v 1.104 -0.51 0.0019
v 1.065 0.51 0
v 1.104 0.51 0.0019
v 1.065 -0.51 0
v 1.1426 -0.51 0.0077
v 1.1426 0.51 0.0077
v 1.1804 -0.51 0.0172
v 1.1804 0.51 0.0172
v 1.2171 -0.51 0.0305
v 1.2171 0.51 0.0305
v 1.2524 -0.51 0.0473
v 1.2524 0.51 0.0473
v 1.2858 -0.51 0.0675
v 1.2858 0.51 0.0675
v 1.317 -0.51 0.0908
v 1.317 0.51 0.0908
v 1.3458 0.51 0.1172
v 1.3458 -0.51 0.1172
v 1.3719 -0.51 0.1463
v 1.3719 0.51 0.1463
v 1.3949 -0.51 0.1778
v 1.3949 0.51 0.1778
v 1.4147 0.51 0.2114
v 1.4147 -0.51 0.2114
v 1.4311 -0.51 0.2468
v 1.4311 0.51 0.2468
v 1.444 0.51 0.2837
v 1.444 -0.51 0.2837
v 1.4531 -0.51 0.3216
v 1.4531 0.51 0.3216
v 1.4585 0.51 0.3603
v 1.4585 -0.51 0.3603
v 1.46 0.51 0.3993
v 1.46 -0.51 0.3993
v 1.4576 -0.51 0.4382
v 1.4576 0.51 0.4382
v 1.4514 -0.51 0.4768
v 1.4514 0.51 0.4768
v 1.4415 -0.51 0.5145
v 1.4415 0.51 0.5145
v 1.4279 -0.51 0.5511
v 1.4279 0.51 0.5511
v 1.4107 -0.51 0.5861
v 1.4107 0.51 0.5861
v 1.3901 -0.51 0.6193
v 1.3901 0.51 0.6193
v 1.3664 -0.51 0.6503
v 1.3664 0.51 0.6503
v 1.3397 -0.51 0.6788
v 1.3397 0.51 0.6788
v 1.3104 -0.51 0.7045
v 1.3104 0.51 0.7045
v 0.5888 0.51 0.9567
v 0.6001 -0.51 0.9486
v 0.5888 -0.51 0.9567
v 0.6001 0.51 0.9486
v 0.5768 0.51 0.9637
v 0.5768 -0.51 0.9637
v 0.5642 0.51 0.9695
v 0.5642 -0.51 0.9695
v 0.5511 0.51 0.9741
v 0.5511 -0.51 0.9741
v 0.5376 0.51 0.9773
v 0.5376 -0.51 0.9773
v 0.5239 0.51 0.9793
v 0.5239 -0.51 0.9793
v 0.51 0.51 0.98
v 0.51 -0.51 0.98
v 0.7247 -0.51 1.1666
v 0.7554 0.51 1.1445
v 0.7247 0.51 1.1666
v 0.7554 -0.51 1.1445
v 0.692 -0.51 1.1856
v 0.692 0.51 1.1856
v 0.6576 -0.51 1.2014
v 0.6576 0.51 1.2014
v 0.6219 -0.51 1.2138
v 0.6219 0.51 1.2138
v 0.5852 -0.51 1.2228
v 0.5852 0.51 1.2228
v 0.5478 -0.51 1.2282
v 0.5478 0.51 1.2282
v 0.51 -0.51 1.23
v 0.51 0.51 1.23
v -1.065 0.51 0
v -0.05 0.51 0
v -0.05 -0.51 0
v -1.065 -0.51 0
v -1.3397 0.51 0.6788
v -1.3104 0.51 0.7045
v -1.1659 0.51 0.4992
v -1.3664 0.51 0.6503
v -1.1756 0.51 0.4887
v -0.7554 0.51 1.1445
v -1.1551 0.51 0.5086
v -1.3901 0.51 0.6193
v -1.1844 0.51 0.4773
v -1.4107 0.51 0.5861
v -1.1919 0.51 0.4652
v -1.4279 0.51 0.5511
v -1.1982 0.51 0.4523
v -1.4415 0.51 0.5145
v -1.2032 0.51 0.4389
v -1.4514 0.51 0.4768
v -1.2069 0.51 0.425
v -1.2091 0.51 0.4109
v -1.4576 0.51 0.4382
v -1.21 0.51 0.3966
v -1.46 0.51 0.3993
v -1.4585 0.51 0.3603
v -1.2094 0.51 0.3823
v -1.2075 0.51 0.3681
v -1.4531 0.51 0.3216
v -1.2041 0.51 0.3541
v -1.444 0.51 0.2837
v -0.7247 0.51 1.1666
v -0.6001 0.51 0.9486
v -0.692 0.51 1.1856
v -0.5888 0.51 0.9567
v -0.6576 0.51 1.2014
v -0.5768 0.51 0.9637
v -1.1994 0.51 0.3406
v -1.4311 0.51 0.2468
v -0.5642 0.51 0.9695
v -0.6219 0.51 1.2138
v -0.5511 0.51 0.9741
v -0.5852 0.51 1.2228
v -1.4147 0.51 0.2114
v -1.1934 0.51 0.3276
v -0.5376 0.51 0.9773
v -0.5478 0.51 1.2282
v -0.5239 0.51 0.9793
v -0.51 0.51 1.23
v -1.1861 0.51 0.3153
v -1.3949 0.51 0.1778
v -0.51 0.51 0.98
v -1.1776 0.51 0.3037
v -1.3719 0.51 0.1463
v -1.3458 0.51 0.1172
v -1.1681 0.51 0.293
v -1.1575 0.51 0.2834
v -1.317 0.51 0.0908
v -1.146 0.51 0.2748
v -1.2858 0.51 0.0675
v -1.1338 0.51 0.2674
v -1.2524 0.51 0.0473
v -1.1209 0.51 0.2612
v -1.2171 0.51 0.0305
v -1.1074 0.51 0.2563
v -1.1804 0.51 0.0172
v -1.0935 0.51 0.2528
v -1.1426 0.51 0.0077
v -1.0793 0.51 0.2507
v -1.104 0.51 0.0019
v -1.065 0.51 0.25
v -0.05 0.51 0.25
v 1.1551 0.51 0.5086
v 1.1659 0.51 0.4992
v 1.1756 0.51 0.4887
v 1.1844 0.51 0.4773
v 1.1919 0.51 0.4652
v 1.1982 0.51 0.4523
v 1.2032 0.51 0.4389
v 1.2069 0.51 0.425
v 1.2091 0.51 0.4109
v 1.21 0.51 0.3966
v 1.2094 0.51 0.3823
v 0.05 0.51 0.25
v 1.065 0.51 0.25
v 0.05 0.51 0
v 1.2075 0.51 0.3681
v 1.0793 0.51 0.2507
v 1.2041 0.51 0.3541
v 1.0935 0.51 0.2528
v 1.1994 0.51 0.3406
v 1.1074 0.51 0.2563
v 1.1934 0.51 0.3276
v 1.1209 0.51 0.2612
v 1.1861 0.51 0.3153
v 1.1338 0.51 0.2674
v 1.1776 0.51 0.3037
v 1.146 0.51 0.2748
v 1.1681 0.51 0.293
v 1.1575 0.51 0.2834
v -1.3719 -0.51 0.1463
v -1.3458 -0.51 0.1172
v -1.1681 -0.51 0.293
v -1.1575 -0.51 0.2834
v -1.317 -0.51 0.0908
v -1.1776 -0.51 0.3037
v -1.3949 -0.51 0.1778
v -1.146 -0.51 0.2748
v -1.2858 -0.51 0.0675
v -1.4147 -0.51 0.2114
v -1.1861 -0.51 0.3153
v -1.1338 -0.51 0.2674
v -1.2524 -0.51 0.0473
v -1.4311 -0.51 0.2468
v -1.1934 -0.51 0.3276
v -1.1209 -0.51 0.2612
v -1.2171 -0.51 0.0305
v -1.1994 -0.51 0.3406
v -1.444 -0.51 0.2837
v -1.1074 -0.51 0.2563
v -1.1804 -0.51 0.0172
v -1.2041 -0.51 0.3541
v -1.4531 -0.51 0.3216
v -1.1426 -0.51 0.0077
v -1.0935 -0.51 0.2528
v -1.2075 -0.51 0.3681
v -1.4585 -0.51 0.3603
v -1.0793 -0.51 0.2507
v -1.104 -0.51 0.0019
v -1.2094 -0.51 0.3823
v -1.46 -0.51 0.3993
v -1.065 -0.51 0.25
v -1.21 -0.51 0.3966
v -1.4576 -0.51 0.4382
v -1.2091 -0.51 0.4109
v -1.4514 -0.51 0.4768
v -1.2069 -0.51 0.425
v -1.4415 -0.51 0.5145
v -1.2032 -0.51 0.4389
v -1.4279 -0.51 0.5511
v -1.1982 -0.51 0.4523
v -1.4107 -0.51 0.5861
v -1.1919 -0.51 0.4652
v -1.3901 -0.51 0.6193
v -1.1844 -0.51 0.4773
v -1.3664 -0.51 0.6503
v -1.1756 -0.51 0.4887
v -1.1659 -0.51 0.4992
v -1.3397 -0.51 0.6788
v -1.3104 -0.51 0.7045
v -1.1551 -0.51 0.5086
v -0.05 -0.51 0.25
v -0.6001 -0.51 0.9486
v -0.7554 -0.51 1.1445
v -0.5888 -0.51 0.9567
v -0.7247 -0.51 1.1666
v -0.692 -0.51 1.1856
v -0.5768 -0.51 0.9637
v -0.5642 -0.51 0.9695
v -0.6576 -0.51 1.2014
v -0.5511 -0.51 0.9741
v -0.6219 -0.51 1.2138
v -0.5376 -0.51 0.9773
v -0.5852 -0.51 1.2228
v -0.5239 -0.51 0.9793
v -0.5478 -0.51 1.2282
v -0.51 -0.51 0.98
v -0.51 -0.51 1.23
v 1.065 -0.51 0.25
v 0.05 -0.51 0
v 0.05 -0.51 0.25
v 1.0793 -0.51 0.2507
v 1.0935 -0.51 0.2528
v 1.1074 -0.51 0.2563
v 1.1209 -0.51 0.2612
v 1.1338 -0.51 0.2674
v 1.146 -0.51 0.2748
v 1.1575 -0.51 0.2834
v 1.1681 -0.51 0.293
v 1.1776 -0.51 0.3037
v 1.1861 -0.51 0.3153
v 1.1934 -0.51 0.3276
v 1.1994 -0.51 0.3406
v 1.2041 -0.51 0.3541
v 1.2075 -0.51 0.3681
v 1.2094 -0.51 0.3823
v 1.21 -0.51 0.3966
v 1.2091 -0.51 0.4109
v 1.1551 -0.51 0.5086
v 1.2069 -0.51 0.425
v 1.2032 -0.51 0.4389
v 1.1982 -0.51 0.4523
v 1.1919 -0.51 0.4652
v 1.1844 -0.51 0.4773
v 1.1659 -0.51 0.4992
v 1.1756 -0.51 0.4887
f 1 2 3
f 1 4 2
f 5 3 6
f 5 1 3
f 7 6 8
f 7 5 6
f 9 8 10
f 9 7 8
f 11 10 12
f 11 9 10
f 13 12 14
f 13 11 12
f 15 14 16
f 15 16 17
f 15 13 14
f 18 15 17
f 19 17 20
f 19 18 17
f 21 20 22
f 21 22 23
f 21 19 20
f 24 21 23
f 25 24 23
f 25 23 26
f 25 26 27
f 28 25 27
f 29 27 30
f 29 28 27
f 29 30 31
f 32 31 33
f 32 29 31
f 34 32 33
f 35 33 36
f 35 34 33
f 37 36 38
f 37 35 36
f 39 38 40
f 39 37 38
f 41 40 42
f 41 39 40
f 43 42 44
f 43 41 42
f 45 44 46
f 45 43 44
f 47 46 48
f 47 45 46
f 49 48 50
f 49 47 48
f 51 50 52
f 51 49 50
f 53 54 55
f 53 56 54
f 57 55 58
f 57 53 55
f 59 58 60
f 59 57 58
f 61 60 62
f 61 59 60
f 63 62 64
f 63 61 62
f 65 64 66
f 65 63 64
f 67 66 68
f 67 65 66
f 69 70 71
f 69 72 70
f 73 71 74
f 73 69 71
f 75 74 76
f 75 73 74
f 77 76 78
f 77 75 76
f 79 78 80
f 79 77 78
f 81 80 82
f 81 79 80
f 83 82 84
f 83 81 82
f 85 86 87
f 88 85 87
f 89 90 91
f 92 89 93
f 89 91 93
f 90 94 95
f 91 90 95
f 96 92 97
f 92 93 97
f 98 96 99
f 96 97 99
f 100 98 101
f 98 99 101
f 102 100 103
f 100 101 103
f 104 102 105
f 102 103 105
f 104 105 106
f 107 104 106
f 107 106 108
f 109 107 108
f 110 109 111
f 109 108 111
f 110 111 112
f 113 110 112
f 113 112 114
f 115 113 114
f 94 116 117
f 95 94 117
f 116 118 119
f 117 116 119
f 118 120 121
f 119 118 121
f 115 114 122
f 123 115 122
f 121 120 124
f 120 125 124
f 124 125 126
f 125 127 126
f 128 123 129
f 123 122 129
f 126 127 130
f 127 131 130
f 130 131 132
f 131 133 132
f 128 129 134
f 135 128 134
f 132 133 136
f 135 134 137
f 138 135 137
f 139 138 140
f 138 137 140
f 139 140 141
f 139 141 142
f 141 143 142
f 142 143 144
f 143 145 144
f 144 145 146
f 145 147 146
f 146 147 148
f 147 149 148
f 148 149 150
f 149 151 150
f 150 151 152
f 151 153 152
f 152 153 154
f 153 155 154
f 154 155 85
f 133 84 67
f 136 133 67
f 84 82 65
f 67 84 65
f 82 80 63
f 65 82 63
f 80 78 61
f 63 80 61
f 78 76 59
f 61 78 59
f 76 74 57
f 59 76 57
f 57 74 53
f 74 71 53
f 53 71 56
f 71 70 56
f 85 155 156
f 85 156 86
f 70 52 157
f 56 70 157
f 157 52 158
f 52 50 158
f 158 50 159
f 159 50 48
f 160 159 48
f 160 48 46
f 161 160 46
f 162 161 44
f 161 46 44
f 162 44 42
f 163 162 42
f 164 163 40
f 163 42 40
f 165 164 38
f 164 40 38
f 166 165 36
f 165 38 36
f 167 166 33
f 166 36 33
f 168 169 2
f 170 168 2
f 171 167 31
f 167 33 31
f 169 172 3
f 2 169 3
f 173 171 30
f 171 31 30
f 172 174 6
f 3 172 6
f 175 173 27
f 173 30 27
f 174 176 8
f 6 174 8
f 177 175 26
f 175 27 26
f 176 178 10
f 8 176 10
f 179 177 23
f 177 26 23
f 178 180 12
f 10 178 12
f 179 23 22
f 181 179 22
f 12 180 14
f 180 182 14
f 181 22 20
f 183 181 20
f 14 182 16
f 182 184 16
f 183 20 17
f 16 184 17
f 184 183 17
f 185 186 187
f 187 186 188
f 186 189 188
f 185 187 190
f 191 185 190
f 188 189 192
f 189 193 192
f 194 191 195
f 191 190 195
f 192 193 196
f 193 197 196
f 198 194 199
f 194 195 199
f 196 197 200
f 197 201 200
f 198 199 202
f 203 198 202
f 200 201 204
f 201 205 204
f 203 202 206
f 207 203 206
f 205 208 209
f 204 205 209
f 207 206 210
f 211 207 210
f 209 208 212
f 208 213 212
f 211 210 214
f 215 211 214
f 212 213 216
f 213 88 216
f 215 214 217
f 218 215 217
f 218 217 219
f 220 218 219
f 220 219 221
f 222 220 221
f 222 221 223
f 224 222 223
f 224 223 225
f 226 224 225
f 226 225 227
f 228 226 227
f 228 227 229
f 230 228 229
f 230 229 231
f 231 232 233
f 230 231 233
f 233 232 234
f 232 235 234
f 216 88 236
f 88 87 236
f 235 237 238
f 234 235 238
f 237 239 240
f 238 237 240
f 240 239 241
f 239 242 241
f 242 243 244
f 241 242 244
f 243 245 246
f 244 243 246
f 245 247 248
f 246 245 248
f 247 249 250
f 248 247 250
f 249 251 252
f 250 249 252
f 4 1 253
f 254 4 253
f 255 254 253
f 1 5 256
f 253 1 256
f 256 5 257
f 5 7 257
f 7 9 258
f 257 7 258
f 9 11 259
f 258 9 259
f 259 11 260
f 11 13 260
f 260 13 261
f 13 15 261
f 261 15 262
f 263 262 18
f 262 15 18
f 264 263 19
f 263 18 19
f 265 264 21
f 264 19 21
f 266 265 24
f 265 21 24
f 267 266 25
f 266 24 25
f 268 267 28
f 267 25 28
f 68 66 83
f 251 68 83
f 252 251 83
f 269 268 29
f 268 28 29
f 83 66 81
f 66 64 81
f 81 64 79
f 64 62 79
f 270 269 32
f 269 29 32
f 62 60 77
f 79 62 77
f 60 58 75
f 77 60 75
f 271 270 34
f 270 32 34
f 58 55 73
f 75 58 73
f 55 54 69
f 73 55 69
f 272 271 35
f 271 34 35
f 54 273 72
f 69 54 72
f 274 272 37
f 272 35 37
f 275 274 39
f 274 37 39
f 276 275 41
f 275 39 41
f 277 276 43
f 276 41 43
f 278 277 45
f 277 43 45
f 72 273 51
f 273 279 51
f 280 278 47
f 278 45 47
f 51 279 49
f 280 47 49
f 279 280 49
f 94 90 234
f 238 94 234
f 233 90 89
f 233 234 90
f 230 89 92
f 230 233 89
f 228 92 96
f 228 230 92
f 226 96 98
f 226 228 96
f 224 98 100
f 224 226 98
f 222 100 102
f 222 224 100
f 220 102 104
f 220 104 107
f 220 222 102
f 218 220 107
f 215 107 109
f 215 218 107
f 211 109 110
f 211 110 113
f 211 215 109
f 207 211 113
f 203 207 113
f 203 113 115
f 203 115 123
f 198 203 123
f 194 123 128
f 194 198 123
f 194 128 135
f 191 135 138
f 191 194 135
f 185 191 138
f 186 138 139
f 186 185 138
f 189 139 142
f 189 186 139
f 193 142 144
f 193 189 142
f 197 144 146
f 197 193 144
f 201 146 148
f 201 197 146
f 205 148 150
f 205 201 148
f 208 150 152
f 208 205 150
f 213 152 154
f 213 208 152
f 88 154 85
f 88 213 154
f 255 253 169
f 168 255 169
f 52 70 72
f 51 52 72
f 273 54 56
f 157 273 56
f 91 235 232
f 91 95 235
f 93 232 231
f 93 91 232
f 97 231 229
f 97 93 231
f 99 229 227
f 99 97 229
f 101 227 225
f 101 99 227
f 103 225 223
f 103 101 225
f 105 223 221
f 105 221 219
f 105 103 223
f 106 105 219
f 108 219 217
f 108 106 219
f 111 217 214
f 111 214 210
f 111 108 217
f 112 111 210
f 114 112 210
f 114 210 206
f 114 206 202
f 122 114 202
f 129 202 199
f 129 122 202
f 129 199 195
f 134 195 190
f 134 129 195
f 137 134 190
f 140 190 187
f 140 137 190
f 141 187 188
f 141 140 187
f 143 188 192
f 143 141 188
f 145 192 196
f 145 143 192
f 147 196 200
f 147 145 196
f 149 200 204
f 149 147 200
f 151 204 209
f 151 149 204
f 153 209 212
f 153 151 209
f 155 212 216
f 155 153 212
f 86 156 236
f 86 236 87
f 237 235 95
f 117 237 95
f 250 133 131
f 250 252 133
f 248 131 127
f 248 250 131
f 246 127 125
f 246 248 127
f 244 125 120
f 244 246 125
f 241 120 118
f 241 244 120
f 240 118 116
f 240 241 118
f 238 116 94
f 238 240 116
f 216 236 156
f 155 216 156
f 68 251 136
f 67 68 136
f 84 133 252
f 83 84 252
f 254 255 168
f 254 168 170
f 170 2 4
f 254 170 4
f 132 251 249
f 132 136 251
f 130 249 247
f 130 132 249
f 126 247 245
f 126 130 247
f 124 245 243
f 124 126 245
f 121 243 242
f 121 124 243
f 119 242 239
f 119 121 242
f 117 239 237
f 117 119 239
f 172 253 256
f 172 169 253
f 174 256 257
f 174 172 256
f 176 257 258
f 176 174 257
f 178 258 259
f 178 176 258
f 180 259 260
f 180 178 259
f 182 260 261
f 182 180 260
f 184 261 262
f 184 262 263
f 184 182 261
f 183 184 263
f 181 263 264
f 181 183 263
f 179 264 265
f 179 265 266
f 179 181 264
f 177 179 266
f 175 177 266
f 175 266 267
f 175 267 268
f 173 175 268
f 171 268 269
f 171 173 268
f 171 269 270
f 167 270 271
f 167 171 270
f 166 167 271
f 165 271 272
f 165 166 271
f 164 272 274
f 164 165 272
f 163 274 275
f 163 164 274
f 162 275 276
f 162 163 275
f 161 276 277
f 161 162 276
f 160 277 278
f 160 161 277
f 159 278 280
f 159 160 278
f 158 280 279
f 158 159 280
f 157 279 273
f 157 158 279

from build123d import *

# Parameters (mm, degrees)
SKETCH001_W = 1.02
SKETCH001_H = 0.25


with BuildPart() as part:
    # AdditivePipe: sweep along a path in Sketch
    with BuildLine(Plane.XZ) as additivepipe_path:
        Line((0.05, 0.125), (1.065, 0.125))
        ThreePointArc((1.065, 0.125), (1.319976, 0.30619), (1.232736, 0.606576))
        Line((1.232736, 0.606576), (0.677736, 1.046576))
        ThreePointArc((0.677736, 1.046576), (0.59881, 1.089976), (0.51, 1.105))
        Line((0.51, 1.105), (-0.51, 1.105))
        ThreePointArc((-0.51, 1.105), (-0.59881, 1.089976), (-0.677736, 1.046576))
        Line((-0.677736, 1.046576), (-1.232736, 0.606576))
        ThreePointArc((-1.232736, 0.606576), (-1.319976, 0.30619), (-1.065, 0.125))
        Line((-1.065, 0.125), (-0.05, 0.125))
    # Sketch001 → AdditivePipe (sweep)
    with BuildSketch(Plane.YZ):
        with Locations((0, 1.105)):
            Rectangle(SKETCH001_W, SKETCH001_H)
    sweep(path=additivepipe_path.line)


solid = part.part
